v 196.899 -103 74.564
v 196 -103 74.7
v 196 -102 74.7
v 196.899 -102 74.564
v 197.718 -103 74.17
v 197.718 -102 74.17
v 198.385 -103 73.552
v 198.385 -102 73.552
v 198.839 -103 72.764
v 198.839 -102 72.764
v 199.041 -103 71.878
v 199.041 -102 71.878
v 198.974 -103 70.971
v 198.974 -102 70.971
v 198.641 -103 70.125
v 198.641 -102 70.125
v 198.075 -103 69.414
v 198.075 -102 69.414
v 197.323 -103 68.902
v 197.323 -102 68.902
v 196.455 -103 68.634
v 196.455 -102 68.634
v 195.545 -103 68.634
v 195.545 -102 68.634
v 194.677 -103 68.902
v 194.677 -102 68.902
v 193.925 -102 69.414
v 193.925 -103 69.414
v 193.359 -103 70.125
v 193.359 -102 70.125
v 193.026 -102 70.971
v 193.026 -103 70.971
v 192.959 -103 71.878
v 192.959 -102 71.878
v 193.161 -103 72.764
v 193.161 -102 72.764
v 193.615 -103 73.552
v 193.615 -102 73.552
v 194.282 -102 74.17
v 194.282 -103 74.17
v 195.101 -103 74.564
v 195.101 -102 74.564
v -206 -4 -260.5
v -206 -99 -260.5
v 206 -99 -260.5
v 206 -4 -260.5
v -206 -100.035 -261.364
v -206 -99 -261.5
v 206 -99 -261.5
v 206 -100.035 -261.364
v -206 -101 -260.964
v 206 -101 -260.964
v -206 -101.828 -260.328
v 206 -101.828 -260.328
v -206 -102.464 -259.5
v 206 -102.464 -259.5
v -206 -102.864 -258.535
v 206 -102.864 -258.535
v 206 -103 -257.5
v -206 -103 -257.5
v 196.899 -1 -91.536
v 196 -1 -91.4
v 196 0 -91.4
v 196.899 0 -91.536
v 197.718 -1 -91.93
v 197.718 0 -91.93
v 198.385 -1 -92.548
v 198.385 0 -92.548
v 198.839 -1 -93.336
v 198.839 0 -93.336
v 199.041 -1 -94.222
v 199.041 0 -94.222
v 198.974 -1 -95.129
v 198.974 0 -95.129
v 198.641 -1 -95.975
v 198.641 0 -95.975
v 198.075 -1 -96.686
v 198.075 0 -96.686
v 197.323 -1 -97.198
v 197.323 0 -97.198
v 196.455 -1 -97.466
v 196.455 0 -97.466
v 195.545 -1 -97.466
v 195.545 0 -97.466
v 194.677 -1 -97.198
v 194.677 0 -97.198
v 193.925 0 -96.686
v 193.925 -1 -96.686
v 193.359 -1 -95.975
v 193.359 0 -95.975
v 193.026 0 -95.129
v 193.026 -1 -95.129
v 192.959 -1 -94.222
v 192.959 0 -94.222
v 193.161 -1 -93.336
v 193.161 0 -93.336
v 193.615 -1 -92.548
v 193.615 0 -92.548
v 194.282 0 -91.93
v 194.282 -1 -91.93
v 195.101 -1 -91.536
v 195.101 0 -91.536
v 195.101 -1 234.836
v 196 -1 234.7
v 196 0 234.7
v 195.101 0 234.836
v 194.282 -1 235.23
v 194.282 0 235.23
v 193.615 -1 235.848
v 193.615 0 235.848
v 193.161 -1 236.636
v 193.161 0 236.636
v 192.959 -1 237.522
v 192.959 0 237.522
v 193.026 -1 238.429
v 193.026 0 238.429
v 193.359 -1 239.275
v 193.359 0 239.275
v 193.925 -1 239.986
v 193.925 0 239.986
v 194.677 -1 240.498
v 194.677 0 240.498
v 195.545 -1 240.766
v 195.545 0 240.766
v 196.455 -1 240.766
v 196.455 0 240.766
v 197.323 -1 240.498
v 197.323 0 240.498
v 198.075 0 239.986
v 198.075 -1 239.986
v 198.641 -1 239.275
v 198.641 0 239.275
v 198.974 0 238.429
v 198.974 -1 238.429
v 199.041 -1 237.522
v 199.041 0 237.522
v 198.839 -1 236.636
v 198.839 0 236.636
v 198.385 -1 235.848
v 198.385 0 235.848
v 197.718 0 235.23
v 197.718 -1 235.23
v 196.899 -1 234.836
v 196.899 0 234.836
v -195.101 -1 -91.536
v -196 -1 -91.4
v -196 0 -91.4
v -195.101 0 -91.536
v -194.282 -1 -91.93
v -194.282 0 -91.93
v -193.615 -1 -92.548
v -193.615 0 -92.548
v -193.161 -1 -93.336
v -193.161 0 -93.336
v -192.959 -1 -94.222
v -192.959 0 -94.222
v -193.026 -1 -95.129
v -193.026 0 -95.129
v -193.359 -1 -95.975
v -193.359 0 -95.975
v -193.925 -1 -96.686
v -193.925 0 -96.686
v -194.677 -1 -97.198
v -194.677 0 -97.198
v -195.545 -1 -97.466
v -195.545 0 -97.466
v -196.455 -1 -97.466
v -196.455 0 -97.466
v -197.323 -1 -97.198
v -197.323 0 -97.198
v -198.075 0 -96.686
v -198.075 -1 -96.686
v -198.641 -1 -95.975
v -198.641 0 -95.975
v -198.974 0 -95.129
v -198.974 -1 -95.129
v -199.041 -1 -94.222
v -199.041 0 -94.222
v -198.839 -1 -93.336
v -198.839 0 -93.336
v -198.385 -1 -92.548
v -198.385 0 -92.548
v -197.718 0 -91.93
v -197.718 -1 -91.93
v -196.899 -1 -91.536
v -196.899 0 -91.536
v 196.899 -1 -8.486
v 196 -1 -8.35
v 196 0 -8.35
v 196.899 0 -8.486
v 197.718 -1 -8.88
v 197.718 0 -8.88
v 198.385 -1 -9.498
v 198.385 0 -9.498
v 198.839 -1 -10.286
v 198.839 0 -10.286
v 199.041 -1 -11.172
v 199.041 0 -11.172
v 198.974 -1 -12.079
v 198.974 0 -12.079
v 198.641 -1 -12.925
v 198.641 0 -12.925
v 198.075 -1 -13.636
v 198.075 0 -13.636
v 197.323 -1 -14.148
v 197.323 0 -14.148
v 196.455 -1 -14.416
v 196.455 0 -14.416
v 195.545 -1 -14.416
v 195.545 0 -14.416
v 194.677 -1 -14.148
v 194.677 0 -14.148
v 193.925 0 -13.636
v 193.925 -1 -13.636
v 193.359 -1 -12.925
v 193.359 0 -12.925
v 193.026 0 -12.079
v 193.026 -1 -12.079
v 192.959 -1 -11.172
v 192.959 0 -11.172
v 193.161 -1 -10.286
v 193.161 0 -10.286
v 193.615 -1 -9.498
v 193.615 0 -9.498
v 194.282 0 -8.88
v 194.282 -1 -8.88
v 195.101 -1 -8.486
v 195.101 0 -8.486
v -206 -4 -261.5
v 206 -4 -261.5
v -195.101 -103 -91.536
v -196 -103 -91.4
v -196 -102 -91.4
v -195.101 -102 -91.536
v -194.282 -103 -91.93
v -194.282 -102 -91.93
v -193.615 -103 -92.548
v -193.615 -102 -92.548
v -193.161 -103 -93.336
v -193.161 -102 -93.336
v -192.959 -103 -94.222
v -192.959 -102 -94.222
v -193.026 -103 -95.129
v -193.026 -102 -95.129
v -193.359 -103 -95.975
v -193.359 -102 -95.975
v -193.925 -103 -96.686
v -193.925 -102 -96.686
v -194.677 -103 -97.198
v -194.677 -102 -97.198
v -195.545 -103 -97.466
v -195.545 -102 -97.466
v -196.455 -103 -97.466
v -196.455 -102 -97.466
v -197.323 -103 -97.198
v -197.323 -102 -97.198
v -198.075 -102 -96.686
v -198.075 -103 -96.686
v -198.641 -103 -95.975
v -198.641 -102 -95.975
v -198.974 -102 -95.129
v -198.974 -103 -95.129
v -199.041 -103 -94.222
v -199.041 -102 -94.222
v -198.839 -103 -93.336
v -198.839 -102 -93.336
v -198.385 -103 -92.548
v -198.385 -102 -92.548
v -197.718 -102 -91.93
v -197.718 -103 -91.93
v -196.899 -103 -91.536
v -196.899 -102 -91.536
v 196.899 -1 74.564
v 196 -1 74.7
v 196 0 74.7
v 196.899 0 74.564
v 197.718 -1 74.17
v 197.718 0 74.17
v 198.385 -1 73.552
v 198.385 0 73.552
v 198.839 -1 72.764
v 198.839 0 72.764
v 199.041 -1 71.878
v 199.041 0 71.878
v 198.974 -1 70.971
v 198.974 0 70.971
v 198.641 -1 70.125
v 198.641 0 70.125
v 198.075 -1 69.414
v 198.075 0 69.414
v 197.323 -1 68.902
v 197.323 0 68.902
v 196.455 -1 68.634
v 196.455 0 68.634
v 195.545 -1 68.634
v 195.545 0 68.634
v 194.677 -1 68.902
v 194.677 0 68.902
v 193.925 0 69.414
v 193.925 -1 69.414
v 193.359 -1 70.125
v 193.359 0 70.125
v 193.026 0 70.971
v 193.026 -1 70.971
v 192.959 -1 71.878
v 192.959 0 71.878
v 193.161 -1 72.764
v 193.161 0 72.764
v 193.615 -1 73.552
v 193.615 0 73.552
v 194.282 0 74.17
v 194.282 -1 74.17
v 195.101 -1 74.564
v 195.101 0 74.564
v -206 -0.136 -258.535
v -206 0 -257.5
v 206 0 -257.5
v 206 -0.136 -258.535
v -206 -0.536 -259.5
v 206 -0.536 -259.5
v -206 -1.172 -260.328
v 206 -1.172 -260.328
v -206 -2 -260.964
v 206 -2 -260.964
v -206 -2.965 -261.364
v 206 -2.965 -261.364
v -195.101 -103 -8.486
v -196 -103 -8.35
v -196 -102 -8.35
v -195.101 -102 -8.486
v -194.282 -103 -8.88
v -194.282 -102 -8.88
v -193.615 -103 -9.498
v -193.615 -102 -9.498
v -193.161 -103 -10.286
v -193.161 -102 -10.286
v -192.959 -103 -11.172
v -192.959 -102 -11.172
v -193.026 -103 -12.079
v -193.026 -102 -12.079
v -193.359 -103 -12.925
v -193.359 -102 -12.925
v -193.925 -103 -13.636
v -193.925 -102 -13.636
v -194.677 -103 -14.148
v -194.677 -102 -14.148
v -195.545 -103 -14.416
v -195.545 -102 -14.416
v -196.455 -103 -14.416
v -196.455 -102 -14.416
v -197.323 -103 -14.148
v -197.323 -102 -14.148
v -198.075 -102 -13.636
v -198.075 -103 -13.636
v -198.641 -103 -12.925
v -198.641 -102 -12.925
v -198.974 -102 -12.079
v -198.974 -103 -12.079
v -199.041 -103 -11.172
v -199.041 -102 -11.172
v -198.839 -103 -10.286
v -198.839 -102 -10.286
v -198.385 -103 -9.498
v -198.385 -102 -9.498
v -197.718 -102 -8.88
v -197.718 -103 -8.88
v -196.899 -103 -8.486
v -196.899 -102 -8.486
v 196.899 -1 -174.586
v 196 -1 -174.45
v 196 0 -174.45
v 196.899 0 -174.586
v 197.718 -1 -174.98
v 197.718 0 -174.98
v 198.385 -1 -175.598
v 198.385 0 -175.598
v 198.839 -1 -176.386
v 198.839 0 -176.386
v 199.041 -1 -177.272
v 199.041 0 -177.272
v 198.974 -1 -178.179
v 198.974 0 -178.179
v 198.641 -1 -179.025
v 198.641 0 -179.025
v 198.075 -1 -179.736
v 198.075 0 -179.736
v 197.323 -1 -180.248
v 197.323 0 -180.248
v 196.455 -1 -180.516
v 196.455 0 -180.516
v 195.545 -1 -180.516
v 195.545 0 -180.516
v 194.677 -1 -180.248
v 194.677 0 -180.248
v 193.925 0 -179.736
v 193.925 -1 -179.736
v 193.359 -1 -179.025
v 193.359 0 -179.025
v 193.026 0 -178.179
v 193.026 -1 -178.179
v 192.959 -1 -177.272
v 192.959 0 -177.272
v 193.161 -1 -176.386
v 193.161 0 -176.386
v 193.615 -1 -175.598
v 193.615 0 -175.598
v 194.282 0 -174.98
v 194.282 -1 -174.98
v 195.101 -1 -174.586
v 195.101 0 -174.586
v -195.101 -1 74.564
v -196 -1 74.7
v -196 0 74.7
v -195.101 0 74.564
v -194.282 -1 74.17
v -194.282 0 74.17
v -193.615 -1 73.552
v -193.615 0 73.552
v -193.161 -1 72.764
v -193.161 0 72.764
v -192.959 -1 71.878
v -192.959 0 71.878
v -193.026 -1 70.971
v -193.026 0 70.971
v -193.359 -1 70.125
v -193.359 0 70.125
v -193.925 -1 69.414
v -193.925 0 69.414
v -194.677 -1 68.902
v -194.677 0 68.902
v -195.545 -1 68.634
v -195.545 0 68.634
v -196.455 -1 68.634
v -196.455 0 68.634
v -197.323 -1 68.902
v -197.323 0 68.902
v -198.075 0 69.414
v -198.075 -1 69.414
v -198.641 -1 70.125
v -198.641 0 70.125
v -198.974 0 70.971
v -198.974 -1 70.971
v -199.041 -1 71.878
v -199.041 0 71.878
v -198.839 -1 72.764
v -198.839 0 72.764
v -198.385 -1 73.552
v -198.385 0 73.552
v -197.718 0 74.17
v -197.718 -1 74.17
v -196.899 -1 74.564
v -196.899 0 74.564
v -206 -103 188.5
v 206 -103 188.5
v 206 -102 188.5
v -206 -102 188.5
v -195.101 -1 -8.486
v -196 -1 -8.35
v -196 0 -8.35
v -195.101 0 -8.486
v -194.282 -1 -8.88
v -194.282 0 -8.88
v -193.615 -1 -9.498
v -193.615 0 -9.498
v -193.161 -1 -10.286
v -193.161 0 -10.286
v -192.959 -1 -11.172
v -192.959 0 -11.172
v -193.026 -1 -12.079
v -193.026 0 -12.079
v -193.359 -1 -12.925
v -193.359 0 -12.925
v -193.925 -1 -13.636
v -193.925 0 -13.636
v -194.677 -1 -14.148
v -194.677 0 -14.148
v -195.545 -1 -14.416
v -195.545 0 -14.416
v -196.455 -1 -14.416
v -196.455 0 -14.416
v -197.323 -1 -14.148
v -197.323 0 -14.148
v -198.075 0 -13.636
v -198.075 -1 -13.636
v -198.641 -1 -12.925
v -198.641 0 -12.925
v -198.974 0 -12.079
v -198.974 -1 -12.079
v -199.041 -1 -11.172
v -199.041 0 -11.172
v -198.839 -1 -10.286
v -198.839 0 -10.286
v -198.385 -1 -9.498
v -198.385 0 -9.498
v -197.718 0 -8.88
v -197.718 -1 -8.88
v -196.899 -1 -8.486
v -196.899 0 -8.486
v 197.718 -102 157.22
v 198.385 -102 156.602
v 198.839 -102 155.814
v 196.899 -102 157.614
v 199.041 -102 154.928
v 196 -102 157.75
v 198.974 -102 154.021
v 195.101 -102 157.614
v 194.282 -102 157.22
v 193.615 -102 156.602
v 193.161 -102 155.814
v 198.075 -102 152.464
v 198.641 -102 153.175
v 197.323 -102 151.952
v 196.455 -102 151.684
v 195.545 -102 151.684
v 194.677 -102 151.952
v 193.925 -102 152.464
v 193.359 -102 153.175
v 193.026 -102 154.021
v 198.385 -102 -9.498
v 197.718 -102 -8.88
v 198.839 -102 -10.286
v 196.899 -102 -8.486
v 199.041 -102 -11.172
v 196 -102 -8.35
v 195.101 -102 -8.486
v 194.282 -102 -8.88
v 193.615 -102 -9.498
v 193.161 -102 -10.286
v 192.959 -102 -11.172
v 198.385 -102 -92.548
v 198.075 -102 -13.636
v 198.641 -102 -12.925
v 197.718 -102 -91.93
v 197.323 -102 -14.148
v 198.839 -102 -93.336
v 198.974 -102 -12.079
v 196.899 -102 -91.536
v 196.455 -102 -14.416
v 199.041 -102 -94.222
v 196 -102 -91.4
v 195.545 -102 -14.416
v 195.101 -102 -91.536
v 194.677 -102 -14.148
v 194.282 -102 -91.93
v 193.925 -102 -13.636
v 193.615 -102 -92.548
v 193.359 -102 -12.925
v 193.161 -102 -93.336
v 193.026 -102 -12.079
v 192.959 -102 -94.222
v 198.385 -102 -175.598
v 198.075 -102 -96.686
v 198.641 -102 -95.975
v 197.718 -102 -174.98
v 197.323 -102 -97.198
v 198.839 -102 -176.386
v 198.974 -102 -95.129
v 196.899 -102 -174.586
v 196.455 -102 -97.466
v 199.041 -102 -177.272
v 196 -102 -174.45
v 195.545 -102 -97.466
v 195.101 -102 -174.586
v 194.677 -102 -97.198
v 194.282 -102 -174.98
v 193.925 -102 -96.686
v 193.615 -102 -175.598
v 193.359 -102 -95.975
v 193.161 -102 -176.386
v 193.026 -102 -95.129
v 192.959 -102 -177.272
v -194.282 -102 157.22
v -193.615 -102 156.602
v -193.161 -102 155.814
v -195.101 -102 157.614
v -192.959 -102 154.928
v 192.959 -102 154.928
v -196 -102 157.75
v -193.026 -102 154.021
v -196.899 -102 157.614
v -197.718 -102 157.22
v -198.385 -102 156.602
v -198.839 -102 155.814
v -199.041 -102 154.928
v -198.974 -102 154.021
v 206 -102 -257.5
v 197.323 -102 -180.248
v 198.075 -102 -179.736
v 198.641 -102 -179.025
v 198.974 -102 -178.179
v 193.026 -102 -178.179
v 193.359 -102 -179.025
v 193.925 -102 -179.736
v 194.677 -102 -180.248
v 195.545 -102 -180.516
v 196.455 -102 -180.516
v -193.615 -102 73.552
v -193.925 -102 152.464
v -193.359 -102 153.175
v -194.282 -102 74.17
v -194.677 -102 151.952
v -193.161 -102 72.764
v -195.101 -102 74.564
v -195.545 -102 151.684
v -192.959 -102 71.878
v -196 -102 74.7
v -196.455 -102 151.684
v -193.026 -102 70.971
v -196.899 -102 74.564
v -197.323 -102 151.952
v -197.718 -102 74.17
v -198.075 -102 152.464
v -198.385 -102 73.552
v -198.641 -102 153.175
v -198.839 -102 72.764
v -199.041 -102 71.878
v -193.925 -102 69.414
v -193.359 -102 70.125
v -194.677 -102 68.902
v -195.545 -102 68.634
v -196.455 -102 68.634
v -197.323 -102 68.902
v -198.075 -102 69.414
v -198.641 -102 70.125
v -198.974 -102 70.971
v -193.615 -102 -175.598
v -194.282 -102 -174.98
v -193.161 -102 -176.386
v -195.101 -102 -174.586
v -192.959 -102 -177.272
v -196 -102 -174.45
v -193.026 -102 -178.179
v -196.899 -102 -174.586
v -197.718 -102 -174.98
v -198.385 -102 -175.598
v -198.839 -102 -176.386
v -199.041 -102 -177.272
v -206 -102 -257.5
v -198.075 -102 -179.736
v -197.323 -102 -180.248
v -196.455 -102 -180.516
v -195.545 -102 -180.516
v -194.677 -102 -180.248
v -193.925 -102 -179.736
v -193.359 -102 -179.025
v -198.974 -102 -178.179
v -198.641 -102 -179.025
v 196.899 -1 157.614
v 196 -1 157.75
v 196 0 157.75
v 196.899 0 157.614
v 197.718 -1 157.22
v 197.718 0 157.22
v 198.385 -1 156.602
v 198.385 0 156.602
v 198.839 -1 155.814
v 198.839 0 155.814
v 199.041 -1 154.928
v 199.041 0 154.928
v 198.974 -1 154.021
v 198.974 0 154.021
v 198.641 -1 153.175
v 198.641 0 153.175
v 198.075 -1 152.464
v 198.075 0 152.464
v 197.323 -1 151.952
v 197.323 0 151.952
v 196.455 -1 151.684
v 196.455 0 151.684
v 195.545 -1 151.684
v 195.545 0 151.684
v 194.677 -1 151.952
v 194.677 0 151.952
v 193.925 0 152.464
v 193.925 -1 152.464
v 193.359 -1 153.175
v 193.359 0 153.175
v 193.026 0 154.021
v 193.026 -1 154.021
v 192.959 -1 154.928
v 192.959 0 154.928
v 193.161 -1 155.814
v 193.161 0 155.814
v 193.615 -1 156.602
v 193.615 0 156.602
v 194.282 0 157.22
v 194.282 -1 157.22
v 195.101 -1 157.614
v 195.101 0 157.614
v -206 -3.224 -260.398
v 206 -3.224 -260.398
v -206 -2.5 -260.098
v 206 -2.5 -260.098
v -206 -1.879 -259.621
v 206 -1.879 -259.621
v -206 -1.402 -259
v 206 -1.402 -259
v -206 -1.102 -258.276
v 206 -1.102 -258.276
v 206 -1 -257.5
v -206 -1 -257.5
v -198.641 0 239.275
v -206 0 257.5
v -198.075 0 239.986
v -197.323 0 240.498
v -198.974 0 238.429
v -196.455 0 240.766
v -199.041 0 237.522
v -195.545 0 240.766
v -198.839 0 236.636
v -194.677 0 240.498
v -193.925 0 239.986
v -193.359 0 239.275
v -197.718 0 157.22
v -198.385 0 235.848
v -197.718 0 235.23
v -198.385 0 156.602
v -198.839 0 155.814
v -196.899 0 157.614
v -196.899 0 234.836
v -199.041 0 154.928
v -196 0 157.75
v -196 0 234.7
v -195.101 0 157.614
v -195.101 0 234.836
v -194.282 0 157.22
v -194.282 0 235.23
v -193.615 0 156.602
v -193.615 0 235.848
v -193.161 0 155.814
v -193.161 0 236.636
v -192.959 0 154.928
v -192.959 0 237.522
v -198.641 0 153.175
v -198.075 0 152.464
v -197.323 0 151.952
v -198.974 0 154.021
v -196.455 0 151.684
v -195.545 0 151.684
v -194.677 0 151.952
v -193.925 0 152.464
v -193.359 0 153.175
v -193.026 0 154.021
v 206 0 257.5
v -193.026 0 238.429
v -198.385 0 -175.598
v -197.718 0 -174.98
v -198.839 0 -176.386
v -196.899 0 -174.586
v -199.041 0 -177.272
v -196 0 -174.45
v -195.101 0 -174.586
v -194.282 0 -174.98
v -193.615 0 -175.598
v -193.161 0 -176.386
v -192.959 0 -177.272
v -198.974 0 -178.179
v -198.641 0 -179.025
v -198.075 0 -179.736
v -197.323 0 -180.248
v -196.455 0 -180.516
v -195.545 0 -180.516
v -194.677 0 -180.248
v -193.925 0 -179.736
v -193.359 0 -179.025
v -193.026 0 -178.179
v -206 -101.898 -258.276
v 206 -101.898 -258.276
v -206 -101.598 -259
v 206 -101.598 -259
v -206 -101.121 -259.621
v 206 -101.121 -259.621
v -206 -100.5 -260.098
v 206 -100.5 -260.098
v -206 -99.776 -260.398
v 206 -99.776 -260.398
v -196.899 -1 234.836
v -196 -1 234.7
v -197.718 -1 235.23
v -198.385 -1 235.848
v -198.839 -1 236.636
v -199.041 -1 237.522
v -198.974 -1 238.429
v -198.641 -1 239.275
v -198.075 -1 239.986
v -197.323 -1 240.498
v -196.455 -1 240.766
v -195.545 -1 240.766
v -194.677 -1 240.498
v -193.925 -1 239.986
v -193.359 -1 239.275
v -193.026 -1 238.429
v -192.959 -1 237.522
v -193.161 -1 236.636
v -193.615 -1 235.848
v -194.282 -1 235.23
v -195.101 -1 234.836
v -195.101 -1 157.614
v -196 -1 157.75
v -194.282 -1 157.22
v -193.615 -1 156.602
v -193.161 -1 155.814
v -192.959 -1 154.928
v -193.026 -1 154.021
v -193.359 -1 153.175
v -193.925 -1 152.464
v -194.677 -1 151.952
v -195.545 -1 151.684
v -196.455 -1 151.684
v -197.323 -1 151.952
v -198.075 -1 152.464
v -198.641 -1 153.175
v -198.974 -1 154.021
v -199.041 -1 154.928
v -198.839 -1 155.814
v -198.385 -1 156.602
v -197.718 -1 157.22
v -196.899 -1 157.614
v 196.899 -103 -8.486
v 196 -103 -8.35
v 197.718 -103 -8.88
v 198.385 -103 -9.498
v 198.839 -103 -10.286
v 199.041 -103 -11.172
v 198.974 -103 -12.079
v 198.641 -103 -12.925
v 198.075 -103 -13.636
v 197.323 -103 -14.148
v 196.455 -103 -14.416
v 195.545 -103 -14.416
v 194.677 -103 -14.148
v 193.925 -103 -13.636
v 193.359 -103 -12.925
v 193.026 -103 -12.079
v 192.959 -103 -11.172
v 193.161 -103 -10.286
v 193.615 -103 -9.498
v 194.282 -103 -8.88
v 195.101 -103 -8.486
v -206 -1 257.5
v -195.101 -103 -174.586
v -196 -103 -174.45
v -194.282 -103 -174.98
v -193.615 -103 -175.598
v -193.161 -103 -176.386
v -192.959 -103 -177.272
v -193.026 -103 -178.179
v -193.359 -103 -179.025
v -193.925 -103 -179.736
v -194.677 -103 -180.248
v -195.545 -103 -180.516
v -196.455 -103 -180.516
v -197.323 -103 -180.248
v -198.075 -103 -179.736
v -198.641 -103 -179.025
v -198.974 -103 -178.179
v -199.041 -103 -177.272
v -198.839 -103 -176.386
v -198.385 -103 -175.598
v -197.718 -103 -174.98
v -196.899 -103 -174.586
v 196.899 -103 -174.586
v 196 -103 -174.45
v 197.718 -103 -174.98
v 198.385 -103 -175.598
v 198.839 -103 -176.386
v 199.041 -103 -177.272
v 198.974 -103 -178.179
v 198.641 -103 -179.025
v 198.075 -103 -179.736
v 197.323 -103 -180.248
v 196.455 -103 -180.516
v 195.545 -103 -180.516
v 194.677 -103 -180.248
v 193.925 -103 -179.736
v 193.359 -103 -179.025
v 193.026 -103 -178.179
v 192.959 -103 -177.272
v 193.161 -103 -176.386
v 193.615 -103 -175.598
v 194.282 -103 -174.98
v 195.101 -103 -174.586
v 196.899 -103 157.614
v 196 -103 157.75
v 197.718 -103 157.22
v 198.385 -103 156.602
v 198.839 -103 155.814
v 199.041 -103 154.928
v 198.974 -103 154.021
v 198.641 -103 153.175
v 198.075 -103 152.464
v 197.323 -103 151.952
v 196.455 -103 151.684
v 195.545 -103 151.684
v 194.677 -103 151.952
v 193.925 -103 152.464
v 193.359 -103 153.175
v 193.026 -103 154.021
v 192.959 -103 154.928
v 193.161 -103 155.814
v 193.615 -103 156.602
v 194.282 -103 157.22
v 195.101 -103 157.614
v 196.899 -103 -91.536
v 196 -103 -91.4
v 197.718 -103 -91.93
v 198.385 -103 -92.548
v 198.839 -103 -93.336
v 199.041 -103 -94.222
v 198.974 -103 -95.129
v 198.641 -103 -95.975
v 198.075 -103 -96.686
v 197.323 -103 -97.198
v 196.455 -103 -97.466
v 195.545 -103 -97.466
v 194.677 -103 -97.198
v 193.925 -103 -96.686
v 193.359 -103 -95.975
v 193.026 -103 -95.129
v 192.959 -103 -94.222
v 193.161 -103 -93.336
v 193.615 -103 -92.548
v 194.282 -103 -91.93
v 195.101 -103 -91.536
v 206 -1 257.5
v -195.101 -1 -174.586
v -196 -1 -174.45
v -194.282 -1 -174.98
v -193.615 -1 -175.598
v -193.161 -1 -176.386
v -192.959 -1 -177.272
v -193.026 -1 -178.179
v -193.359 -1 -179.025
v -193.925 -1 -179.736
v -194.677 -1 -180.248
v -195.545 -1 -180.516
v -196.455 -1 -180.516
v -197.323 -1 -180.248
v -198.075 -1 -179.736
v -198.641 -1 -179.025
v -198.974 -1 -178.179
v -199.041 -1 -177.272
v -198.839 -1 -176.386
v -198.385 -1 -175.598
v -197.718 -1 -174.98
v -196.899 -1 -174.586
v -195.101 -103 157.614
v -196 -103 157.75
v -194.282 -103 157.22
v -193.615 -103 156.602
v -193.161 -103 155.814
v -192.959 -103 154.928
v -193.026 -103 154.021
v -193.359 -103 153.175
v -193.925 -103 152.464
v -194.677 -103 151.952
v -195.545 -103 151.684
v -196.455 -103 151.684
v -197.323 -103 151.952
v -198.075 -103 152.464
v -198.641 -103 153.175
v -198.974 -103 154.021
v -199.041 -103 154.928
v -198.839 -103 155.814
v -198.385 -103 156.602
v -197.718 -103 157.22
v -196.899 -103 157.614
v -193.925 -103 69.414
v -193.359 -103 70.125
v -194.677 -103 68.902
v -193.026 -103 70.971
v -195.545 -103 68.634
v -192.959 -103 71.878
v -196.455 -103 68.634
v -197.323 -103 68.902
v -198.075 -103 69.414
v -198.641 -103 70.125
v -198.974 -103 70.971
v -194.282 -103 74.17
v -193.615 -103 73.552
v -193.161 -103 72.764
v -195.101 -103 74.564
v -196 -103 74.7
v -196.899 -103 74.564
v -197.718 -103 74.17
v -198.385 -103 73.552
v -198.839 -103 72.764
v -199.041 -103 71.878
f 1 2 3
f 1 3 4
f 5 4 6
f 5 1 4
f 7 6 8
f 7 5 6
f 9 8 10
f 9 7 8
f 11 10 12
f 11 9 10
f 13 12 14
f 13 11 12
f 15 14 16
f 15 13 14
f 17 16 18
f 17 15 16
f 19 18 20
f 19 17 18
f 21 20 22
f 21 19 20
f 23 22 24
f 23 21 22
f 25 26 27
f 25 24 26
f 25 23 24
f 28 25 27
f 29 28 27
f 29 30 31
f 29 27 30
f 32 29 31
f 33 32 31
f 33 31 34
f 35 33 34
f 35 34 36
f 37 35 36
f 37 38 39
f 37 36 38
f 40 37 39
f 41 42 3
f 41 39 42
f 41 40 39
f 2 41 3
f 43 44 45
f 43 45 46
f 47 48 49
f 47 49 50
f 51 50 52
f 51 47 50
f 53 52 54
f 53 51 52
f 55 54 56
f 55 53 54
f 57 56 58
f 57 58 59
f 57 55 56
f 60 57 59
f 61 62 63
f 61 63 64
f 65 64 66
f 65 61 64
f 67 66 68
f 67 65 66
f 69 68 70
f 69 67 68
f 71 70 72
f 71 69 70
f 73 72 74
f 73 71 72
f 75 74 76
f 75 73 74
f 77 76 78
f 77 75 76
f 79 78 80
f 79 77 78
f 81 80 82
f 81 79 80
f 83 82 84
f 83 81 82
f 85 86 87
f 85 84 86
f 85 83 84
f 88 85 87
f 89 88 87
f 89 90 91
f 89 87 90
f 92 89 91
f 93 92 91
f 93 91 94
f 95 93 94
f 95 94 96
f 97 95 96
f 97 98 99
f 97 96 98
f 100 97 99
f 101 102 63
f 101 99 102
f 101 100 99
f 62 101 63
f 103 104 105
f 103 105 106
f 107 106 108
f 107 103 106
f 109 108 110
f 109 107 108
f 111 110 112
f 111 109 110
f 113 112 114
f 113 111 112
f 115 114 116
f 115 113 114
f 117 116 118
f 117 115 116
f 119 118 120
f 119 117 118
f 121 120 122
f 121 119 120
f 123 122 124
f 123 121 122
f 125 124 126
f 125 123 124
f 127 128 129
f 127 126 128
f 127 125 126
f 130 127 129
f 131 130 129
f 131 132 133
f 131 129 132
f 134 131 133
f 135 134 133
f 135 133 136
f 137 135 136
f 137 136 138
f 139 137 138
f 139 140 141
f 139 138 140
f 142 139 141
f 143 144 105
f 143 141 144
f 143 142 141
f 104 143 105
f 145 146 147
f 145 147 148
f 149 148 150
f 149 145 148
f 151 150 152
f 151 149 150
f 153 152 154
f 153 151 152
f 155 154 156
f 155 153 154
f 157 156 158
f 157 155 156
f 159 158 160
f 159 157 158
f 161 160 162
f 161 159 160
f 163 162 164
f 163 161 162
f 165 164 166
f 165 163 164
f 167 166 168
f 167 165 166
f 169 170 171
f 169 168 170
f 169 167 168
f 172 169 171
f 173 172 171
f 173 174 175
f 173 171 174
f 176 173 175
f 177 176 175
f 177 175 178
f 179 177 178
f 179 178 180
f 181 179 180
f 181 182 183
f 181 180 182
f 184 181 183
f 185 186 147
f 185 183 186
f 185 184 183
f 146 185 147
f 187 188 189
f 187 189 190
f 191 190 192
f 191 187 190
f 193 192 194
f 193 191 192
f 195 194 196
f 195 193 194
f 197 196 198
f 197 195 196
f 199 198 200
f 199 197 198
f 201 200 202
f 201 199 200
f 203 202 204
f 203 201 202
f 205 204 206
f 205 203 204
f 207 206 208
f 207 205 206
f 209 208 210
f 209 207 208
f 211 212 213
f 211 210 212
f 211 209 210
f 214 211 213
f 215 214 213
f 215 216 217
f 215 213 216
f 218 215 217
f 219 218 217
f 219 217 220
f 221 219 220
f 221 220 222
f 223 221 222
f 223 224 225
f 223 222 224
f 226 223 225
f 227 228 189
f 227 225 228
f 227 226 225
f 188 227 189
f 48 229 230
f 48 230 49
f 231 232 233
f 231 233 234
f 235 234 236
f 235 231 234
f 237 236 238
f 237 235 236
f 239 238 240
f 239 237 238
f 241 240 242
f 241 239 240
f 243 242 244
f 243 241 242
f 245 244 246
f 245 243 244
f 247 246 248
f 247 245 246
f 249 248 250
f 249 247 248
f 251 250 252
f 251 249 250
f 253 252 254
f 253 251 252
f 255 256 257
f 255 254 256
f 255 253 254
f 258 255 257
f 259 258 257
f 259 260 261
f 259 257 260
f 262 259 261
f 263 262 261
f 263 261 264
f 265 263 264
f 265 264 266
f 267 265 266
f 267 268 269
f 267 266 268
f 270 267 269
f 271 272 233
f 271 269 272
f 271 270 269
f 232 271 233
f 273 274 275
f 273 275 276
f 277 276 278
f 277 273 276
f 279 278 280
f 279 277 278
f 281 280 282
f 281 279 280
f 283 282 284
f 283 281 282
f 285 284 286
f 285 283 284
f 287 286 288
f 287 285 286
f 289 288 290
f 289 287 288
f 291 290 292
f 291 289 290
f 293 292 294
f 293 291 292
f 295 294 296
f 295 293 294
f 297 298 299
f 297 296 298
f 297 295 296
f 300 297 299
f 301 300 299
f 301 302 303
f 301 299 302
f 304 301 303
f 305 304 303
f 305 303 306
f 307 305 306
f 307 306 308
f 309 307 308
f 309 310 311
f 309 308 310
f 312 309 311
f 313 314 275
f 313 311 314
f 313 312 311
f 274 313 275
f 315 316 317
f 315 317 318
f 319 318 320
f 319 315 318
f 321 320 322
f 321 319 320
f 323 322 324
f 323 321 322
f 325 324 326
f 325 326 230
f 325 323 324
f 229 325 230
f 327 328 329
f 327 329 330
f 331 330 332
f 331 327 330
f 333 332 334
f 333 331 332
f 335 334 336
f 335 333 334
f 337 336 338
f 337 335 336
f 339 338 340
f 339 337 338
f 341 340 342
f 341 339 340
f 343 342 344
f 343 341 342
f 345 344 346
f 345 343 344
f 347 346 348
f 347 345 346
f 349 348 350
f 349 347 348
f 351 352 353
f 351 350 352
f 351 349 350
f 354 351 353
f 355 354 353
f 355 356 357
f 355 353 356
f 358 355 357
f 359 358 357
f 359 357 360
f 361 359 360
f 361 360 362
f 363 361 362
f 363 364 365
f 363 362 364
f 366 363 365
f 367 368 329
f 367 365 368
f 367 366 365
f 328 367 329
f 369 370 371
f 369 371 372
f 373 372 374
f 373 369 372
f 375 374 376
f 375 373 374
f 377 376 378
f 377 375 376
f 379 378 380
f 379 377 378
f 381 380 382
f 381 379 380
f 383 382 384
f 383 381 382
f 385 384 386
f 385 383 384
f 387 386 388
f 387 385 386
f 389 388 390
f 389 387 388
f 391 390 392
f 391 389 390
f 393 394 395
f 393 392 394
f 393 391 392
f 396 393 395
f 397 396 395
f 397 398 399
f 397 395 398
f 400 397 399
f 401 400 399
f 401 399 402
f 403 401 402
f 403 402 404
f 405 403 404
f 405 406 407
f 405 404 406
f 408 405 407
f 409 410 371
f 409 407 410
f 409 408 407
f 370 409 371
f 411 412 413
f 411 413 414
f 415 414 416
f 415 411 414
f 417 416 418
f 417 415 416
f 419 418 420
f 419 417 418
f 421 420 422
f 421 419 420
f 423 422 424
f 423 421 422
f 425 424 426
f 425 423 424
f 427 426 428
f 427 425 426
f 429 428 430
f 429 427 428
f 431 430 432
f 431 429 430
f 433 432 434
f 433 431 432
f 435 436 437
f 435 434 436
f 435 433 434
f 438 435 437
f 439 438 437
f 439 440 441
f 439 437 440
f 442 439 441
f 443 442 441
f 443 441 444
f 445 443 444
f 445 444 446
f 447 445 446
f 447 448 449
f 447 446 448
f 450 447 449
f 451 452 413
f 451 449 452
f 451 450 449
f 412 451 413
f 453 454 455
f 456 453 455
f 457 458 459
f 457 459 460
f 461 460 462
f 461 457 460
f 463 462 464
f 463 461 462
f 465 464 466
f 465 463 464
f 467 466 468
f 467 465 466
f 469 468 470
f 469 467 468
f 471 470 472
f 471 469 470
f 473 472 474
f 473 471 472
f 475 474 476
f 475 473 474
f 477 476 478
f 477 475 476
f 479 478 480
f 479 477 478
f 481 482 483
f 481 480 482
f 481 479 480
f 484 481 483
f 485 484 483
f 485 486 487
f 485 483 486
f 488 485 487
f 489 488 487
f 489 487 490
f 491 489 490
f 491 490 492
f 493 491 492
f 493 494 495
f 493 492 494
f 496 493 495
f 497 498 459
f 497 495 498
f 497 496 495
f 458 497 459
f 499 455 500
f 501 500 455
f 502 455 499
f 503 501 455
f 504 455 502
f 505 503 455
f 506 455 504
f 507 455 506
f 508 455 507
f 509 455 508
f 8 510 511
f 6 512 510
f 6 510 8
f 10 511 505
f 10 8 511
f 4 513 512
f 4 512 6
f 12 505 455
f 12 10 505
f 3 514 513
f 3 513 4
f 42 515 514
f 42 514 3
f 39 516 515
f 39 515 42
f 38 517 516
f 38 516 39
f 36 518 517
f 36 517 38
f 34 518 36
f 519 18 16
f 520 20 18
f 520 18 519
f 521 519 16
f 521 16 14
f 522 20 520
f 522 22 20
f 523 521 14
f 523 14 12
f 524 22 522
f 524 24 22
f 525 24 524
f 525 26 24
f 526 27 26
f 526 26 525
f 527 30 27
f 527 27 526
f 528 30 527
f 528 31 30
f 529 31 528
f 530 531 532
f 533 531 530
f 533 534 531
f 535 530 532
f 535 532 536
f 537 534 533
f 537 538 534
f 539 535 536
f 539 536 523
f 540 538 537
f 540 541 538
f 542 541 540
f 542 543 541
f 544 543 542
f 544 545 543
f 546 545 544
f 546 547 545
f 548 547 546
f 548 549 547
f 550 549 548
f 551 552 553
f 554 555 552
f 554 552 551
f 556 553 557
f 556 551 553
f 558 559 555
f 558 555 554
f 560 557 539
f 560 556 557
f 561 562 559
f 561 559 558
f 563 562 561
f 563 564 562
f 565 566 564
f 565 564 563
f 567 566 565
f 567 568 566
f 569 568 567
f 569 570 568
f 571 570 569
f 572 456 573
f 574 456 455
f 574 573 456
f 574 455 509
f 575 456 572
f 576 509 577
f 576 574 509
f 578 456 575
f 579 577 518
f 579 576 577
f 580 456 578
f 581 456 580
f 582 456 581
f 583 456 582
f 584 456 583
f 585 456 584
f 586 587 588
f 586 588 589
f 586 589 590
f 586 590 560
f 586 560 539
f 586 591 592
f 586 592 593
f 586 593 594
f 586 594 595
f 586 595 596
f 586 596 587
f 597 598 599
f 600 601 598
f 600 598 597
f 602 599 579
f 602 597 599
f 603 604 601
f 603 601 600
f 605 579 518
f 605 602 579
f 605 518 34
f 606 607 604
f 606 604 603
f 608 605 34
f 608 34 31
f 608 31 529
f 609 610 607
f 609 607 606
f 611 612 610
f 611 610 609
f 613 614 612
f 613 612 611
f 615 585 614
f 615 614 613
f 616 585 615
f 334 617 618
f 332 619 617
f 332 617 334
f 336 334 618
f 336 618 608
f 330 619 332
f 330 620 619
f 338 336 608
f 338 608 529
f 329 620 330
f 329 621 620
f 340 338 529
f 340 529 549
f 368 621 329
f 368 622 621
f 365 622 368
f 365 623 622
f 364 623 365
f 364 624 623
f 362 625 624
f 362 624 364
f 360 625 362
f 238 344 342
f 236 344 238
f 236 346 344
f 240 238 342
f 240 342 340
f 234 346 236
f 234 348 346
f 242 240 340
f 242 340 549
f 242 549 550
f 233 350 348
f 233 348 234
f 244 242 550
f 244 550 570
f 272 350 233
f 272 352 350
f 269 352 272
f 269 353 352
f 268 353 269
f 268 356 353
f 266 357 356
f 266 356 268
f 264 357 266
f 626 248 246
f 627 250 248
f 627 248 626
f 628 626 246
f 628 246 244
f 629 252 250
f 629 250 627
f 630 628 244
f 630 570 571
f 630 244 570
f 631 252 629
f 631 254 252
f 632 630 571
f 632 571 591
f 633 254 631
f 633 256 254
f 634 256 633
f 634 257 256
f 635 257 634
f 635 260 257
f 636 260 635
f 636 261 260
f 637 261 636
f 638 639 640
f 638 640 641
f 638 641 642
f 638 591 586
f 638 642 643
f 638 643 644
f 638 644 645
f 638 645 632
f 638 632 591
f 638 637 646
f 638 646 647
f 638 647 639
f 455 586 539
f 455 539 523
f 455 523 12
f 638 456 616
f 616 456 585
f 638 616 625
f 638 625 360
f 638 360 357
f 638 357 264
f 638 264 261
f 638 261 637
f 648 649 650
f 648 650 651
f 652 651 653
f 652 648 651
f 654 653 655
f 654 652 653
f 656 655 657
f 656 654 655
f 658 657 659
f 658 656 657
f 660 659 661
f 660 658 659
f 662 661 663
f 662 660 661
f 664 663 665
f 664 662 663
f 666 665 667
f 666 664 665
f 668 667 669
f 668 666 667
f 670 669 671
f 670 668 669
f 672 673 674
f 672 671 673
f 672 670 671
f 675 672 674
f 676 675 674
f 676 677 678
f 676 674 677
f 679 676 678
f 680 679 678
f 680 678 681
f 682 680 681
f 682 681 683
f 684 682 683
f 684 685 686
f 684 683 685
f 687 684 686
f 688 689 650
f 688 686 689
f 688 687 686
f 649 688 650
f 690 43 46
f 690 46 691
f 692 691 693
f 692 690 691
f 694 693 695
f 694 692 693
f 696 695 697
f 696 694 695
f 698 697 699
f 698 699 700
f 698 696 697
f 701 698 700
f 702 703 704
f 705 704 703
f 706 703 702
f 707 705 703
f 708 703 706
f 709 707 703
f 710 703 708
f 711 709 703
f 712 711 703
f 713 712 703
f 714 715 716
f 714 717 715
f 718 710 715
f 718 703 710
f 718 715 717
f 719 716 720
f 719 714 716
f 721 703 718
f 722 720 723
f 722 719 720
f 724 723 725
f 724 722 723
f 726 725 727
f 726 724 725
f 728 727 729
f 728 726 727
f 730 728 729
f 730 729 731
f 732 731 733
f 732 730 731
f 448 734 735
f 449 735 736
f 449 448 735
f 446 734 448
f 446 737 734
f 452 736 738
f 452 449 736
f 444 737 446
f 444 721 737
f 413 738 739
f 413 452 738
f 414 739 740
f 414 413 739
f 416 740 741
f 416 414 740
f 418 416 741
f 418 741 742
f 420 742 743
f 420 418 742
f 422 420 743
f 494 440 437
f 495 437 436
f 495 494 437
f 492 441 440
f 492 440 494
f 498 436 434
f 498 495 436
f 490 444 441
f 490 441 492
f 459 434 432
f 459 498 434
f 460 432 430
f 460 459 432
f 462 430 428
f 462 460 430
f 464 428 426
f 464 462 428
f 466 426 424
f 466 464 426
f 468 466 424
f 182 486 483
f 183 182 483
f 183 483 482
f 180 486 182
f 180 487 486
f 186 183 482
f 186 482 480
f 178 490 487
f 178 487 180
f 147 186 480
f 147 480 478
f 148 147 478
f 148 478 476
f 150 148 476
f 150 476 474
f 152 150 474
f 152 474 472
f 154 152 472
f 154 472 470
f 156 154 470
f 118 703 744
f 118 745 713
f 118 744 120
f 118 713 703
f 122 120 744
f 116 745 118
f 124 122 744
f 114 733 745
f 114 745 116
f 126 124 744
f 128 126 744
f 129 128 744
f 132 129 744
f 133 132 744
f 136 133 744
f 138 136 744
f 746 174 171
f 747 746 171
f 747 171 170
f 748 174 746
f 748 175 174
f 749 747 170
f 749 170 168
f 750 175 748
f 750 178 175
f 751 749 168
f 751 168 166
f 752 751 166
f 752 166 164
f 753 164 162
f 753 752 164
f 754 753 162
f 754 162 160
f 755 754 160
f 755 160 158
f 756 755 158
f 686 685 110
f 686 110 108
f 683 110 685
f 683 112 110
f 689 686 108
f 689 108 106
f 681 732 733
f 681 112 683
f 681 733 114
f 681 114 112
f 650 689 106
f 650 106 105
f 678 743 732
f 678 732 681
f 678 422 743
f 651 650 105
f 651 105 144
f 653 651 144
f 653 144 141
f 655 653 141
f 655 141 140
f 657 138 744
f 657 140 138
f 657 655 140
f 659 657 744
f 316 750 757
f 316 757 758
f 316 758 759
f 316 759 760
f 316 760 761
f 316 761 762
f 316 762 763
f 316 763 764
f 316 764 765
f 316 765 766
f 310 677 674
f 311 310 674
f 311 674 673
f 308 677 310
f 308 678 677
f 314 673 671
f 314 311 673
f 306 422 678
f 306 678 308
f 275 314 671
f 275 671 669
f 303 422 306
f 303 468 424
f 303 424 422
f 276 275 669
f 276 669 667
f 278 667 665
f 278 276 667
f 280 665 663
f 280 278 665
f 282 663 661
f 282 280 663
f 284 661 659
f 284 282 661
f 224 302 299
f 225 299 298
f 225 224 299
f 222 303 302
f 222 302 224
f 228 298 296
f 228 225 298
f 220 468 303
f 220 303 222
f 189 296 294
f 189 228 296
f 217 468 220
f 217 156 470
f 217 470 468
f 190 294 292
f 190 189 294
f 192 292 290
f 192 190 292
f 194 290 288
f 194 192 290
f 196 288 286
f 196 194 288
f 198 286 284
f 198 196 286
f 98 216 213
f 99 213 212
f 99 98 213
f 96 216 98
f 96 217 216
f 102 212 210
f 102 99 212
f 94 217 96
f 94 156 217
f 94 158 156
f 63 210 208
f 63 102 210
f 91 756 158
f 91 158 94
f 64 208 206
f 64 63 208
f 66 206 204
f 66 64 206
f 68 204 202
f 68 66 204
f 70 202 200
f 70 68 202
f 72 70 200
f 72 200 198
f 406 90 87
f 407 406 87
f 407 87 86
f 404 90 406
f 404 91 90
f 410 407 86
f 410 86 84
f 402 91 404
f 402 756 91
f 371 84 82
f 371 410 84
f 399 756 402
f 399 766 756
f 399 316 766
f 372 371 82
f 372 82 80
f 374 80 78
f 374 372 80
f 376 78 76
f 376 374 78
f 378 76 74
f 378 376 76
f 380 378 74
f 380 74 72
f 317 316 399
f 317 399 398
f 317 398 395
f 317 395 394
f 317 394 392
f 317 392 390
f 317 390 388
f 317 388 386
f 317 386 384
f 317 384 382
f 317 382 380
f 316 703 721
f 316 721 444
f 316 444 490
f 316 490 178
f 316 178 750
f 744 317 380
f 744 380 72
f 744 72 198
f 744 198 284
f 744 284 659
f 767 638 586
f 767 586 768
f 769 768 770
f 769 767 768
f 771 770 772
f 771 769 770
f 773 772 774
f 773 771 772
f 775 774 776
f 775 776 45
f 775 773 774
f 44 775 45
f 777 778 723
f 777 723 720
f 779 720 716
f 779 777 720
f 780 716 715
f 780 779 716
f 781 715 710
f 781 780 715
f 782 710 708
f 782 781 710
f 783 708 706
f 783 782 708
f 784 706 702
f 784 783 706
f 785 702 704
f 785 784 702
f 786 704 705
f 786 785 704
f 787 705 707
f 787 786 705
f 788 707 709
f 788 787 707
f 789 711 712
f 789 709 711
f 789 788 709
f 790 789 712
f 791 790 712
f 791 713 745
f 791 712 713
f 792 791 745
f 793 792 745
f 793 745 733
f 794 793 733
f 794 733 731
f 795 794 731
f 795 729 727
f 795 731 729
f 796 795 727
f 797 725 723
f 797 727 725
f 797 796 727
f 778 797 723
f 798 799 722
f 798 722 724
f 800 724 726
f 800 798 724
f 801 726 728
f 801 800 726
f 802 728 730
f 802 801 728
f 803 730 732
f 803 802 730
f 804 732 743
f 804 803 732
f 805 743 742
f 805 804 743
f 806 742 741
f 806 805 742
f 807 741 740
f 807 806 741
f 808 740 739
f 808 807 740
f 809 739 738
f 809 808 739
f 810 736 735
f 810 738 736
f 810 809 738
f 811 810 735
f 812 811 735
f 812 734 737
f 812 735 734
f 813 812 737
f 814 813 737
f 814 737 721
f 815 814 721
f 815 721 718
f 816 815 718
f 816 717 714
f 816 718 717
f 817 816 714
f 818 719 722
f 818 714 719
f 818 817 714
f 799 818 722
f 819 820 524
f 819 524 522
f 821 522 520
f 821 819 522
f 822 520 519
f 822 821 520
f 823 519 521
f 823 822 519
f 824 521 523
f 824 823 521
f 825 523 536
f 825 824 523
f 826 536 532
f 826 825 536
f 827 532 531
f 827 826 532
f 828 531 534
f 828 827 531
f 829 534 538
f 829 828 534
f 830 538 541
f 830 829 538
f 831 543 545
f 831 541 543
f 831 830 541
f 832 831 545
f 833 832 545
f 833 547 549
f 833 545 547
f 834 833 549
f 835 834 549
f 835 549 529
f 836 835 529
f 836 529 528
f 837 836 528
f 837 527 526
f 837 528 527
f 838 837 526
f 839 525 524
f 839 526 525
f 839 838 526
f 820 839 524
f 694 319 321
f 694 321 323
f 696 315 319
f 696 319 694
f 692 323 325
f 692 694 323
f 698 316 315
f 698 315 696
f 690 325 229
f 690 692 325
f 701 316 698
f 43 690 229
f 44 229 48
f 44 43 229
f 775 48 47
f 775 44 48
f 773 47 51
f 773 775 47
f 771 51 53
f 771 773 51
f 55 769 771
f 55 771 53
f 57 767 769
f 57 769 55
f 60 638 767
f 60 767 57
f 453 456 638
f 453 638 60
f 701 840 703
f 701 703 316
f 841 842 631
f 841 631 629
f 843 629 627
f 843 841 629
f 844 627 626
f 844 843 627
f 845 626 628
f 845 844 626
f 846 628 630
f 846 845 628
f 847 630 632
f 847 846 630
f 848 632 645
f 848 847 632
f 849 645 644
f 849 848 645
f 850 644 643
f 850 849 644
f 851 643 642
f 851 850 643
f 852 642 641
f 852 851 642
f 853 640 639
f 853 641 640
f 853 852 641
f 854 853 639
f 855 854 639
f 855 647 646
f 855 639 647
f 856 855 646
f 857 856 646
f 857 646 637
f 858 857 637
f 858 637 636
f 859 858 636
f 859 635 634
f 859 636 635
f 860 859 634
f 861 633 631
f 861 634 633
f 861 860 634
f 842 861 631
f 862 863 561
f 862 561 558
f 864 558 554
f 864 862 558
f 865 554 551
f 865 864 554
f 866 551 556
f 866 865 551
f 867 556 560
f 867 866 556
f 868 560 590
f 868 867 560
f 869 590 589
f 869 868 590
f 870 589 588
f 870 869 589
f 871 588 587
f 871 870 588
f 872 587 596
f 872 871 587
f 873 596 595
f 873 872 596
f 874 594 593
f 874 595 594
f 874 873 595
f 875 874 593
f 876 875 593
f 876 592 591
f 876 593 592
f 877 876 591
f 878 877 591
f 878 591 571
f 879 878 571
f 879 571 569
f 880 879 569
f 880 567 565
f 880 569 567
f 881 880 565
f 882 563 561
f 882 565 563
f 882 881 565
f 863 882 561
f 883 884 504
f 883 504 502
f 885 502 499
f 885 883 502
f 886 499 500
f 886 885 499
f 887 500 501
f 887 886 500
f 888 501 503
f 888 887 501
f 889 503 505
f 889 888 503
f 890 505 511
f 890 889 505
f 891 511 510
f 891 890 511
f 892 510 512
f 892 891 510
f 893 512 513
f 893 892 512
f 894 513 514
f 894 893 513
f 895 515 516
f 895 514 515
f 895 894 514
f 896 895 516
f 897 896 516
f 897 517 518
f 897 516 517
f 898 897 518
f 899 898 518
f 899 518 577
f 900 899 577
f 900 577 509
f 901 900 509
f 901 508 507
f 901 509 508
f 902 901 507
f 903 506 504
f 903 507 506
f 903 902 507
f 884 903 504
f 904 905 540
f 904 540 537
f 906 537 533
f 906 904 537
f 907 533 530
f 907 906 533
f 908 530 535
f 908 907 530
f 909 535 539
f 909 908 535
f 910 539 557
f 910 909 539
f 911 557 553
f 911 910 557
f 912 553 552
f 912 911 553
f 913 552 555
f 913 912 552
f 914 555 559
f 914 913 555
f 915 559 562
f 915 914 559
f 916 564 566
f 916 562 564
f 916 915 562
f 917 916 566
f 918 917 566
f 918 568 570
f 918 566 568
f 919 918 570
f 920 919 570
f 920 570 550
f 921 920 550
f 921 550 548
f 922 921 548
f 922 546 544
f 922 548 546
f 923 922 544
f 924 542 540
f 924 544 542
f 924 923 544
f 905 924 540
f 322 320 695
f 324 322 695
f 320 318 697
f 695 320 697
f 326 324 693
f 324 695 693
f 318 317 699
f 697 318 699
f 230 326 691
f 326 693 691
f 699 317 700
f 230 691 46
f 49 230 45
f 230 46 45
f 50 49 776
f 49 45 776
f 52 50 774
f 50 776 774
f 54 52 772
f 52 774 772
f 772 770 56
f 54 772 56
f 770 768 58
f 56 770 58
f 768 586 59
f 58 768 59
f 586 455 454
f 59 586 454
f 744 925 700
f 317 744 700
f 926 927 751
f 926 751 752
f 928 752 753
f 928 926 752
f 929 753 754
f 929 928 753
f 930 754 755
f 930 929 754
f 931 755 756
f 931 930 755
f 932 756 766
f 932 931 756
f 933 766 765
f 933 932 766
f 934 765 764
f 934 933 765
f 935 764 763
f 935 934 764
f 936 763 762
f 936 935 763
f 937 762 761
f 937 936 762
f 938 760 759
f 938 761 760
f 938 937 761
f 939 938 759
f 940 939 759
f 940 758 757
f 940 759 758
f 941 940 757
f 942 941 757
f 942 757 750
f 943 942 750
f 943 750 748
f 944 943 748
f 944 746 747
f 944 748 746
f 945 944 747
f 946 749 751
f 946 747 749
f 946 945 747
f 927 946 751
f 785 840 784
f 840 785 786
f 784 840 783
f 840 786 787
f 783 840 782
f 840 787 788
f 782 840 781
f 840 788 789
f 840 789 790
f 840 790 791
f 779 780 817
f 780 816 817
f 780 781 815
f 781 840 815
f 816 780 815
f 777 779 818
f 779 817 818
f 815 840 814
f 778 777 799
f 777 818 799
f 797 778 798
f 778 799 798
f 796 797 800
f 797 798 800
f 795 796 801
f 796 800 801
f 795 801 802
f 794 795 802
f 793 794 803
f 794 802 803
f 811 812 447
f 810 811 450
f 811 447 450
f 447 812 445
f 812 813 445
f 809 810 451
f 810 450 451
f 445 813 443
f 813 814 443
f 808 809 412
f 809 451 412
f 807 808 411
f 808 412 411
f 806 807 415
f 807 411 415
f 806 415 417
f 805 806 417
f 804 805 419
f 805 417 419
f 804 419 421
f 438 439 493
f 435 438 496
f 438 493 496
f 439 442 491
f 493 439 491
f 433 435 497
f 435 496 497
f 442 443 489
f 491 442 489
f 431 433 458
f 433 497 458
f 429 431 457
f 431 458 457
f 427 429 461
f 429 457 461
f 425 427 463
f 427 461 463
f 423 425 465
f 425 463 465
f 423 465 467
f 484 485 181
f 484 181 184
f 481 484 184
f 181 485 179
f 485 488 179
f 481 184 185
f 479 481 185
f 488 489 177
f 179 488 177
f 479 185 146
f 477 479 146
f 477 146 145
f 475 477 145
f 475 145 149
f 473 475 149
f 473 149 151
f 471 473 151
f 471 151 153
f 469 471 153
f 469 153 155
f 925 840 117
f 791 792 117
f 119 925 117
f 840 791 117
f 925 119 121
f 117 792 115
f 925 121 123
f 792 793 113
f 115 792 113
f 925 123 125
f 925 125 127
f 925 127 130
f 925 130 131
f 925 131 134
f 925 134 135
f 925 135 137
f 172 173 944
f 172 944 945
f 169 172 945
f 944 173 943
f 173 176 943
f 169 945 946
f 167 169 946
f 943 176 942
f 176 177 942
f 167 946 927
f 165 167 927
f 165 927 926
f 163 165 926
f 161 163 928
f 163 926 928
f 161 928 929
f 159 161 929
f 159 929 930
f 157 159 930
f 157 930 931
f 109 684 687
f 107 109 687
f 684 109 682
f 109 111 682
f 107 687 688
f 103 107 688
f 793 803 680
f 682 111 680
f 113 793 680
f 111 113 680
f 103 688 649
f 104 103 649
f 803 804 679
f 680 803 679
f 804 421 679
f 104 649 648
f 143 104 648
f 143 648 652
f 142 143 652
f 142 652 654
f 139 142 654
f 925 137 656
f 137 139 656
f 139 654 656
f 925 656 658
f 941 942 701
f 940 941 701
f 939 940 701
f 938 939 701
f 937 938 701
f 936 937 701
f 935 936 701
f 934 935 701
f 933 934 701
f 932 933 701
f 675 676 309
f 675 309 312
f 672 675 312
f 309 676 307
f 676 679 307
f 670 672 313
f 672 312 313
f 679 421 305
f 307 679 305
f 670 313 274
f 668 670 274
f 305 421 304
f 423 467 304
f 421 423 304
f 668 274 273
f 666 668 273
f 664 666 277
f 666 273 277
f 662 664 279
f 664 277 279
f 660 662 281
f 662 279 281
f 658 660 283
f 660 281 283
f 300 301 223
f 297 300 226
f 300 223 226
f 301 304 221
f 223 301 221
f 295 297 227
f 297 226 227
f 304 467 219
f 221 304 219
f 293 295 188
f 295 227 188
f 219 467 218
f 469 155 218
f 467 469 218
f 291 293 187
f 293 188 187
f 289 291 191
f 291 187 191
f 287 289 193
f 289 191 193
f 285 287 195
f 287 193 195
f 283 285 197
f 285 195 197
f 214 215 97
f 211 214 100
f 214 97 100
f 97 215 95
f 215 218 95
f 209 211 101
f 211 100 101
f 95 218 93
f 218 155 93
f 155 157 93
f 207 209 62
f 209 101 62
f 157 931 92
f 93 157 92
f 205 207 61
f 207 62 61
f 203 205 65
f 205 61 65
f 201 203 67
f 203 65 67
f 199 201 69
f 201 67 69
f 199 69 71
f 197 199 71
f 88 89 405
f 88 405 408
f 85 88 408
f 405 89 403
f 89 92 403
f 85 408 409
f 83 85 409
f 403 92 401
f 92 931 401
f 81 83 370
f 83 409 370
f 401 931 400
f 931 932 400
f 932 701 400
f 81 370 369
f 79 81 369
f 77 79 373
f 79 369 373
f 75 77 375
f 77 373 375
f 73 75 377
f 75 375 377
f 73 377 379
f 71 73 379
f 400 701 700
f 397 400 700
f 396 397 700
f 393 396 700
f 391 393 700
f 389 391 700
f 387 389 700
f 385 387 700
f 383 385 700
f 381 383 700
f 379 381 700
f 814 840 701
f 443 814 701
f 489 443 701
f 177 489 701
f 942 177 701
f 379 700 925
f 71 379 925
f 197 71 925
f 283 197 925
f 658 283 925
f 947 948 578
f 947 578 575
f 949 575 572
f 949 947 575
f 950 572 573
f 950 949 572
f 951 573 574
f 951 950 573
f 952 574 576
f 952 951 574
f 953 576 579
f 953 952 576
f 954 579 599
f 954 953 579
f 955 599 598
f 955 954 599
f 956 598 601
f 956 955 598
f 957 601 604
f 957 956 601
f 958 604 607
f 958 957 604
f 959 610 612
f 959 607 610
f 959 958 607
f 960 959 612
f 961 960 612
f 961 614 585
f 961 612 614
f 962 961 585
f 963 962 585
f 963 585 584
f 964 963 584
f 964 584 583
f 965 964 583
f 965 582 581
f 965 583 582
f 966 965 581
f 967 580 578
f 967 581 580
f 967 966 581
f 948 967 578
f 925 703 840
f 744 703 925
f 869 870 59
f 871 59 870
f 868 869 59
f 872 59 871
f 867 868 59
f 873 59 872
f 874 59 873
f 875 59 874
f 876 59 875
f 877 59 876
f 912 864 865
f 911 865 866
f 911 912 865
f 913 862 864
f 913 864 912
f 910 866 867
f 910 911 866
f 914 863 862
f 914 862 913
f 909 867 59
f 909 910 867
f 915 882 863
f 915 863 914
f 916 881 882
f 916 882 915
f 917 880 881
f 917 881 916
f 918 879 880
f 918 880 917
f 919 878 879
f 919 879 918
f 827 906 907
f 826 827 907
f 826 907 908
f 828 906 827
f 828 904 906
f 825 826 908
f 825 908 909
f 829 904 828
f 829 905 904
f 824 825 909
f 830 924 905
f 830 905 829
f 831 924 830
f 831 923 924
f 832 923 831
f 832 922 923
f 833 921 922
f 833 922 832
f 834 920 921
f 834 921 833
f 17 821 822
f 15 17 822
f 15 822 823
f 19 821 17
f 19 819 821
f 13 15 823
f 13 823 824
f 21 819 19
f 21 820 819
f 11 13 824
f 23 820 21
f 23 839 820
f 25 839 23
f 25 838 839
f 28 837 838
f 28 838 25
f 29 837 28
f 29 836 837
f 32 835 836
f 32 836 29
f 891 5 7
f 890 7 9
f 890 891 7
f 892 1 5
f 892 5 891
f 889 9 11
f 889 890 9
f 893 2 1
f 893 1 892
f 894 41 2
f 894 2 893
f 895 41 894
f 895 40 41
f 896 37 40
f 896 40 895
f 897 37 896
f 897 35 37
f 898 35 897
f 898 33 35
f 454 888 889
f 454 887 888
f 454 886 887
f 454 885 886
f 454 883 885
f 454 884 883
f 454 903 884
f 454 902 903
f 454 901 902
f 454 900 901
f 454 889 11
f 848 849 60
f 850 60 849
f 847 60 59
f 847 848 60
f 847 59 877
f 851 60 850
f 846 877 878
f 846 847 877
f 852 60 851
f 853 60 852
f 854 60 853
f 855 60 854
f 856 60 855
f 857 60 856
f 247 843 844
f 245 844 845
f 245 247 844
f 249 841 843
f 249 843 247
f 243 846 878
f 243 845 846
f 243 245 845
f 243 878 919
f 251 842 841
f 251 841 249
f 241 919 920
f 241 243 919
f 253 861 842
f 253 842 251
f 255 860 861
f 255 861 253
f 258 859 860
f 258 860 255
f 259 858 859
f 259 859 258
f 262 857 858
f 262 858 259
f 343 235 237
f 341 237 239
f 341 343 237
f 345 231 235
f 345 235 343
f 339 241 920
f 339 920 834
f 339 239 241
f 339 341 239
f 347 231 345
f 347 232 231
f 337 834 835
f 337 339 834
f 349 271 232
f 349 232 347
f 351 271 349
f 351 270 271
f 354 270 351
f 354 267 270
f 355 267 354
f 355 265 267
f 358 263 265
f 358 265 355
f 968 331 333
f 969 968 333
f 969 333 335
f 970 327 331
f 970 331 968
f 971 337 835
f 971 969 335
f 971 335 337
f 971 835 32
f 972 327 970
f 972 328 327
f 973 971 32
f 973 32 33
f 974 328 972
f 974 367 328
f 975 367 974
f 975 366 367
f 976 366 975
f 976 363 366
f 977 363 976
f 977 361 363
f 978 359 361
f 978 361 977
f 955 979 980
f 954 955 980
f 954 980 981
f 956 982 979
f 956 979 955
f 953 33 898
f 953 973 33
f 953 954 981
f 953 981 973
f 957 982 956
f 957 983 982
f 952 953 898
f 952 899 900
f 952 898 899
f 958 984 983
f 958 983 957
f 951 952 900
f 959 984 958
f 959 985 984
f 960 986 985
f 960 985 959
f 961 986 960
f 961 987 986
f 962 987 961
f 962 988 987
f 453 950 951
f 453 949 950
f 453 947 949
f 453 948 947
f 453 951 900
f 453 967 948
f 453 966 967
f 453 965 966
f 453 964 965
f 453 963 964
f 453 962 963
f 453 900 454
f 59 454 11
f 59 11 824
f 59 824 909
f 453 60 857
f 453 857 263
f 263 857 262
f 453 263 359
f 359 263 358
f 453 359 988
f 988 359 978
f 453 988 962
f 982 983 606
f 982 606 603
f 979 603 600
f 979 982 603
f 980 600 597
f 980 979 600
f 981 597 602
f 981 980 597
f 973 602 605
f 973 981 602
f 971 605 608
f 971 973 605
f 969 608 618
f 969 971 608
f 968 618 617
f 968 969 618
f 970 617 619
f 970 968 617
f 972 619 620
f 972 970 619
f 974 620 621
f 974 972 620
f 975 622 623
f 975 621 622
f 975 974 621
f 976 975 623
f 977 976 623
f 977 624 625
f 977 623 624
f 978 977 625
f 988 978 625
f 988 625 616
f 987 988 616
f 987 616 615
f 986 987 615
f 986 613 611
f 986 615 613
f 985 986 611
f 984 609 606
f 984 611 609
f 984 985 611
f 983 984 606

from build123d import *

# Parameters (mm, degrees)
SKETCH1_W               = 412
SKETCH1_H               = 515
BASE_FLANGE1_DEPTH      = 1
EDGE_FLANGE1_DEPTH      = 412
EDGE_FLANGE2_DEPTH      = 412
CUT_EXTRUDE1_DEPTH      = 349.464130148
CUT_EXTRUDE1_DEPTH_BACK = 349.464130148
SKETCH12_R              = 3.05


# Sheet-metal steps are written as plain solids
with BuildPart() as part:
    # Sketch1 → Base-Flange1 (new body)
    with BuildSketch(Plane(origin=(0, 0, 0), x_dir=(1, 0, 0), z_dir=(0, 1, 0))):
        Rectangle(SKETCH1_W, SKETCH1_H)
    extrude(amount=-BASE_FLANGE1_DEPTH)

    # Edge-Flange1 section (across the edge) → Edge-Flange1 (add)
    with BuildSketch(Plane(origin=(-206, -1, -260.5), x_dir=(0, 0, 1), z_dir=(1, 0, 0))):
        with BuildLine():
            Line((-1, 3), (-1, 98))
            Line((-1, 98), (0, 98))
            Line((0, 98), (0, 3))
            ThreePointArc((0, 3), (0.878679656, 0.878679656), (3, 0))
            Line((3, 0), (3, -1))
            ThreePointArc((3, -1), (0.171572875, 0.171572875), (-1, 3))
        make_face()
    extrude(amount=EDGE_FLANGE1_DEPTH)

    # Edge-Flange2 section (across the edge) → Edge-Flange2 (add)
    with BuildSketch(Plane(origin=(-206, -102, -260.5), x_dir=(0, 1, 0), z_dir=(1, 0, 0))):
        with BuildLine():
            Line((-1, 3), (-1, 449))
            Line((-1, 449), (0, 449))
            Line((0, 449), (0, 3))
            ThreePointArc((0, 3), (0.878679656, 0.878679656), (3, 0))
            Line((3, 0), (3, -1))
            ThreePointArc((3, -1), (0.171572875, 0.171572875), (-1, 3))
        make_face()
    extrude(amount=EDGE_FLANGE2_DEPTH)

    # Sketch12 → Cut-Extrude1 (cut, two sides: drawn at the far end of the back side and taken through both)
    with BuildSketch(Plane(origin=(0, 0, 0), x_dir=(1, 0, 0), z_dir=(0, 1, 0)).offset(-CUT_EXTRUDE1_DEPTH_BACK)):
        with Locations(Location((196, 177.5, 0), (0, 0, 270))):
            Circle(SKETCH12_R)
        with Locations(Location((196, 94.45, 0), (0, 0, 270))):
            Circle(SKETCH12_R)
        with Locations(Location((196, 11.4, 0), (0, 0, 270))):
            Circle(SKETCH12_R)
        with Locations(Location((196, -71.65, 0), (0, 0, 270))):
            Circle(SKETCH12_R)
        with Locations(Location((196, -154.7, 0), (0, 0, 270))):
            Circle(SKETCH12_R)
        with Locations(Location((196, -237.75, 0), (0, 0, 90))):
            Circle(SKETCH12_R)
        with Locations(Location((-196, -237.75, 0), (0, 0, 90))):
            Circle(SKETCH12_R)
        with Locations(Location((-196, -154.7, 0), (0, 0, 270))):
            Circle(SKETCH12_R)
        with Locations(Location((-196, -71.65, 0), (0, 0, 270))):
            Circle(SKETCH12_R)
        with Locations(Location((-196, 11.4, 0), (0, 0, 270))):
            Circle(SKETCH12_R)
        with Locations(Location((-196, 94.45, 0), (0, 0, 270))):
            Circle(SKETCH12_R)
        with Locations(Location((-196, 177.5, 0), (0, 0, 270))):
            Circle(SKETCH12_R)
    extrude(amount=CUT_EXTRUDE1_DEPTH + CUT_EXTRUDE1_DEPTH_BACK, mode=Mode.SUBTRACT)


solid = part.part
